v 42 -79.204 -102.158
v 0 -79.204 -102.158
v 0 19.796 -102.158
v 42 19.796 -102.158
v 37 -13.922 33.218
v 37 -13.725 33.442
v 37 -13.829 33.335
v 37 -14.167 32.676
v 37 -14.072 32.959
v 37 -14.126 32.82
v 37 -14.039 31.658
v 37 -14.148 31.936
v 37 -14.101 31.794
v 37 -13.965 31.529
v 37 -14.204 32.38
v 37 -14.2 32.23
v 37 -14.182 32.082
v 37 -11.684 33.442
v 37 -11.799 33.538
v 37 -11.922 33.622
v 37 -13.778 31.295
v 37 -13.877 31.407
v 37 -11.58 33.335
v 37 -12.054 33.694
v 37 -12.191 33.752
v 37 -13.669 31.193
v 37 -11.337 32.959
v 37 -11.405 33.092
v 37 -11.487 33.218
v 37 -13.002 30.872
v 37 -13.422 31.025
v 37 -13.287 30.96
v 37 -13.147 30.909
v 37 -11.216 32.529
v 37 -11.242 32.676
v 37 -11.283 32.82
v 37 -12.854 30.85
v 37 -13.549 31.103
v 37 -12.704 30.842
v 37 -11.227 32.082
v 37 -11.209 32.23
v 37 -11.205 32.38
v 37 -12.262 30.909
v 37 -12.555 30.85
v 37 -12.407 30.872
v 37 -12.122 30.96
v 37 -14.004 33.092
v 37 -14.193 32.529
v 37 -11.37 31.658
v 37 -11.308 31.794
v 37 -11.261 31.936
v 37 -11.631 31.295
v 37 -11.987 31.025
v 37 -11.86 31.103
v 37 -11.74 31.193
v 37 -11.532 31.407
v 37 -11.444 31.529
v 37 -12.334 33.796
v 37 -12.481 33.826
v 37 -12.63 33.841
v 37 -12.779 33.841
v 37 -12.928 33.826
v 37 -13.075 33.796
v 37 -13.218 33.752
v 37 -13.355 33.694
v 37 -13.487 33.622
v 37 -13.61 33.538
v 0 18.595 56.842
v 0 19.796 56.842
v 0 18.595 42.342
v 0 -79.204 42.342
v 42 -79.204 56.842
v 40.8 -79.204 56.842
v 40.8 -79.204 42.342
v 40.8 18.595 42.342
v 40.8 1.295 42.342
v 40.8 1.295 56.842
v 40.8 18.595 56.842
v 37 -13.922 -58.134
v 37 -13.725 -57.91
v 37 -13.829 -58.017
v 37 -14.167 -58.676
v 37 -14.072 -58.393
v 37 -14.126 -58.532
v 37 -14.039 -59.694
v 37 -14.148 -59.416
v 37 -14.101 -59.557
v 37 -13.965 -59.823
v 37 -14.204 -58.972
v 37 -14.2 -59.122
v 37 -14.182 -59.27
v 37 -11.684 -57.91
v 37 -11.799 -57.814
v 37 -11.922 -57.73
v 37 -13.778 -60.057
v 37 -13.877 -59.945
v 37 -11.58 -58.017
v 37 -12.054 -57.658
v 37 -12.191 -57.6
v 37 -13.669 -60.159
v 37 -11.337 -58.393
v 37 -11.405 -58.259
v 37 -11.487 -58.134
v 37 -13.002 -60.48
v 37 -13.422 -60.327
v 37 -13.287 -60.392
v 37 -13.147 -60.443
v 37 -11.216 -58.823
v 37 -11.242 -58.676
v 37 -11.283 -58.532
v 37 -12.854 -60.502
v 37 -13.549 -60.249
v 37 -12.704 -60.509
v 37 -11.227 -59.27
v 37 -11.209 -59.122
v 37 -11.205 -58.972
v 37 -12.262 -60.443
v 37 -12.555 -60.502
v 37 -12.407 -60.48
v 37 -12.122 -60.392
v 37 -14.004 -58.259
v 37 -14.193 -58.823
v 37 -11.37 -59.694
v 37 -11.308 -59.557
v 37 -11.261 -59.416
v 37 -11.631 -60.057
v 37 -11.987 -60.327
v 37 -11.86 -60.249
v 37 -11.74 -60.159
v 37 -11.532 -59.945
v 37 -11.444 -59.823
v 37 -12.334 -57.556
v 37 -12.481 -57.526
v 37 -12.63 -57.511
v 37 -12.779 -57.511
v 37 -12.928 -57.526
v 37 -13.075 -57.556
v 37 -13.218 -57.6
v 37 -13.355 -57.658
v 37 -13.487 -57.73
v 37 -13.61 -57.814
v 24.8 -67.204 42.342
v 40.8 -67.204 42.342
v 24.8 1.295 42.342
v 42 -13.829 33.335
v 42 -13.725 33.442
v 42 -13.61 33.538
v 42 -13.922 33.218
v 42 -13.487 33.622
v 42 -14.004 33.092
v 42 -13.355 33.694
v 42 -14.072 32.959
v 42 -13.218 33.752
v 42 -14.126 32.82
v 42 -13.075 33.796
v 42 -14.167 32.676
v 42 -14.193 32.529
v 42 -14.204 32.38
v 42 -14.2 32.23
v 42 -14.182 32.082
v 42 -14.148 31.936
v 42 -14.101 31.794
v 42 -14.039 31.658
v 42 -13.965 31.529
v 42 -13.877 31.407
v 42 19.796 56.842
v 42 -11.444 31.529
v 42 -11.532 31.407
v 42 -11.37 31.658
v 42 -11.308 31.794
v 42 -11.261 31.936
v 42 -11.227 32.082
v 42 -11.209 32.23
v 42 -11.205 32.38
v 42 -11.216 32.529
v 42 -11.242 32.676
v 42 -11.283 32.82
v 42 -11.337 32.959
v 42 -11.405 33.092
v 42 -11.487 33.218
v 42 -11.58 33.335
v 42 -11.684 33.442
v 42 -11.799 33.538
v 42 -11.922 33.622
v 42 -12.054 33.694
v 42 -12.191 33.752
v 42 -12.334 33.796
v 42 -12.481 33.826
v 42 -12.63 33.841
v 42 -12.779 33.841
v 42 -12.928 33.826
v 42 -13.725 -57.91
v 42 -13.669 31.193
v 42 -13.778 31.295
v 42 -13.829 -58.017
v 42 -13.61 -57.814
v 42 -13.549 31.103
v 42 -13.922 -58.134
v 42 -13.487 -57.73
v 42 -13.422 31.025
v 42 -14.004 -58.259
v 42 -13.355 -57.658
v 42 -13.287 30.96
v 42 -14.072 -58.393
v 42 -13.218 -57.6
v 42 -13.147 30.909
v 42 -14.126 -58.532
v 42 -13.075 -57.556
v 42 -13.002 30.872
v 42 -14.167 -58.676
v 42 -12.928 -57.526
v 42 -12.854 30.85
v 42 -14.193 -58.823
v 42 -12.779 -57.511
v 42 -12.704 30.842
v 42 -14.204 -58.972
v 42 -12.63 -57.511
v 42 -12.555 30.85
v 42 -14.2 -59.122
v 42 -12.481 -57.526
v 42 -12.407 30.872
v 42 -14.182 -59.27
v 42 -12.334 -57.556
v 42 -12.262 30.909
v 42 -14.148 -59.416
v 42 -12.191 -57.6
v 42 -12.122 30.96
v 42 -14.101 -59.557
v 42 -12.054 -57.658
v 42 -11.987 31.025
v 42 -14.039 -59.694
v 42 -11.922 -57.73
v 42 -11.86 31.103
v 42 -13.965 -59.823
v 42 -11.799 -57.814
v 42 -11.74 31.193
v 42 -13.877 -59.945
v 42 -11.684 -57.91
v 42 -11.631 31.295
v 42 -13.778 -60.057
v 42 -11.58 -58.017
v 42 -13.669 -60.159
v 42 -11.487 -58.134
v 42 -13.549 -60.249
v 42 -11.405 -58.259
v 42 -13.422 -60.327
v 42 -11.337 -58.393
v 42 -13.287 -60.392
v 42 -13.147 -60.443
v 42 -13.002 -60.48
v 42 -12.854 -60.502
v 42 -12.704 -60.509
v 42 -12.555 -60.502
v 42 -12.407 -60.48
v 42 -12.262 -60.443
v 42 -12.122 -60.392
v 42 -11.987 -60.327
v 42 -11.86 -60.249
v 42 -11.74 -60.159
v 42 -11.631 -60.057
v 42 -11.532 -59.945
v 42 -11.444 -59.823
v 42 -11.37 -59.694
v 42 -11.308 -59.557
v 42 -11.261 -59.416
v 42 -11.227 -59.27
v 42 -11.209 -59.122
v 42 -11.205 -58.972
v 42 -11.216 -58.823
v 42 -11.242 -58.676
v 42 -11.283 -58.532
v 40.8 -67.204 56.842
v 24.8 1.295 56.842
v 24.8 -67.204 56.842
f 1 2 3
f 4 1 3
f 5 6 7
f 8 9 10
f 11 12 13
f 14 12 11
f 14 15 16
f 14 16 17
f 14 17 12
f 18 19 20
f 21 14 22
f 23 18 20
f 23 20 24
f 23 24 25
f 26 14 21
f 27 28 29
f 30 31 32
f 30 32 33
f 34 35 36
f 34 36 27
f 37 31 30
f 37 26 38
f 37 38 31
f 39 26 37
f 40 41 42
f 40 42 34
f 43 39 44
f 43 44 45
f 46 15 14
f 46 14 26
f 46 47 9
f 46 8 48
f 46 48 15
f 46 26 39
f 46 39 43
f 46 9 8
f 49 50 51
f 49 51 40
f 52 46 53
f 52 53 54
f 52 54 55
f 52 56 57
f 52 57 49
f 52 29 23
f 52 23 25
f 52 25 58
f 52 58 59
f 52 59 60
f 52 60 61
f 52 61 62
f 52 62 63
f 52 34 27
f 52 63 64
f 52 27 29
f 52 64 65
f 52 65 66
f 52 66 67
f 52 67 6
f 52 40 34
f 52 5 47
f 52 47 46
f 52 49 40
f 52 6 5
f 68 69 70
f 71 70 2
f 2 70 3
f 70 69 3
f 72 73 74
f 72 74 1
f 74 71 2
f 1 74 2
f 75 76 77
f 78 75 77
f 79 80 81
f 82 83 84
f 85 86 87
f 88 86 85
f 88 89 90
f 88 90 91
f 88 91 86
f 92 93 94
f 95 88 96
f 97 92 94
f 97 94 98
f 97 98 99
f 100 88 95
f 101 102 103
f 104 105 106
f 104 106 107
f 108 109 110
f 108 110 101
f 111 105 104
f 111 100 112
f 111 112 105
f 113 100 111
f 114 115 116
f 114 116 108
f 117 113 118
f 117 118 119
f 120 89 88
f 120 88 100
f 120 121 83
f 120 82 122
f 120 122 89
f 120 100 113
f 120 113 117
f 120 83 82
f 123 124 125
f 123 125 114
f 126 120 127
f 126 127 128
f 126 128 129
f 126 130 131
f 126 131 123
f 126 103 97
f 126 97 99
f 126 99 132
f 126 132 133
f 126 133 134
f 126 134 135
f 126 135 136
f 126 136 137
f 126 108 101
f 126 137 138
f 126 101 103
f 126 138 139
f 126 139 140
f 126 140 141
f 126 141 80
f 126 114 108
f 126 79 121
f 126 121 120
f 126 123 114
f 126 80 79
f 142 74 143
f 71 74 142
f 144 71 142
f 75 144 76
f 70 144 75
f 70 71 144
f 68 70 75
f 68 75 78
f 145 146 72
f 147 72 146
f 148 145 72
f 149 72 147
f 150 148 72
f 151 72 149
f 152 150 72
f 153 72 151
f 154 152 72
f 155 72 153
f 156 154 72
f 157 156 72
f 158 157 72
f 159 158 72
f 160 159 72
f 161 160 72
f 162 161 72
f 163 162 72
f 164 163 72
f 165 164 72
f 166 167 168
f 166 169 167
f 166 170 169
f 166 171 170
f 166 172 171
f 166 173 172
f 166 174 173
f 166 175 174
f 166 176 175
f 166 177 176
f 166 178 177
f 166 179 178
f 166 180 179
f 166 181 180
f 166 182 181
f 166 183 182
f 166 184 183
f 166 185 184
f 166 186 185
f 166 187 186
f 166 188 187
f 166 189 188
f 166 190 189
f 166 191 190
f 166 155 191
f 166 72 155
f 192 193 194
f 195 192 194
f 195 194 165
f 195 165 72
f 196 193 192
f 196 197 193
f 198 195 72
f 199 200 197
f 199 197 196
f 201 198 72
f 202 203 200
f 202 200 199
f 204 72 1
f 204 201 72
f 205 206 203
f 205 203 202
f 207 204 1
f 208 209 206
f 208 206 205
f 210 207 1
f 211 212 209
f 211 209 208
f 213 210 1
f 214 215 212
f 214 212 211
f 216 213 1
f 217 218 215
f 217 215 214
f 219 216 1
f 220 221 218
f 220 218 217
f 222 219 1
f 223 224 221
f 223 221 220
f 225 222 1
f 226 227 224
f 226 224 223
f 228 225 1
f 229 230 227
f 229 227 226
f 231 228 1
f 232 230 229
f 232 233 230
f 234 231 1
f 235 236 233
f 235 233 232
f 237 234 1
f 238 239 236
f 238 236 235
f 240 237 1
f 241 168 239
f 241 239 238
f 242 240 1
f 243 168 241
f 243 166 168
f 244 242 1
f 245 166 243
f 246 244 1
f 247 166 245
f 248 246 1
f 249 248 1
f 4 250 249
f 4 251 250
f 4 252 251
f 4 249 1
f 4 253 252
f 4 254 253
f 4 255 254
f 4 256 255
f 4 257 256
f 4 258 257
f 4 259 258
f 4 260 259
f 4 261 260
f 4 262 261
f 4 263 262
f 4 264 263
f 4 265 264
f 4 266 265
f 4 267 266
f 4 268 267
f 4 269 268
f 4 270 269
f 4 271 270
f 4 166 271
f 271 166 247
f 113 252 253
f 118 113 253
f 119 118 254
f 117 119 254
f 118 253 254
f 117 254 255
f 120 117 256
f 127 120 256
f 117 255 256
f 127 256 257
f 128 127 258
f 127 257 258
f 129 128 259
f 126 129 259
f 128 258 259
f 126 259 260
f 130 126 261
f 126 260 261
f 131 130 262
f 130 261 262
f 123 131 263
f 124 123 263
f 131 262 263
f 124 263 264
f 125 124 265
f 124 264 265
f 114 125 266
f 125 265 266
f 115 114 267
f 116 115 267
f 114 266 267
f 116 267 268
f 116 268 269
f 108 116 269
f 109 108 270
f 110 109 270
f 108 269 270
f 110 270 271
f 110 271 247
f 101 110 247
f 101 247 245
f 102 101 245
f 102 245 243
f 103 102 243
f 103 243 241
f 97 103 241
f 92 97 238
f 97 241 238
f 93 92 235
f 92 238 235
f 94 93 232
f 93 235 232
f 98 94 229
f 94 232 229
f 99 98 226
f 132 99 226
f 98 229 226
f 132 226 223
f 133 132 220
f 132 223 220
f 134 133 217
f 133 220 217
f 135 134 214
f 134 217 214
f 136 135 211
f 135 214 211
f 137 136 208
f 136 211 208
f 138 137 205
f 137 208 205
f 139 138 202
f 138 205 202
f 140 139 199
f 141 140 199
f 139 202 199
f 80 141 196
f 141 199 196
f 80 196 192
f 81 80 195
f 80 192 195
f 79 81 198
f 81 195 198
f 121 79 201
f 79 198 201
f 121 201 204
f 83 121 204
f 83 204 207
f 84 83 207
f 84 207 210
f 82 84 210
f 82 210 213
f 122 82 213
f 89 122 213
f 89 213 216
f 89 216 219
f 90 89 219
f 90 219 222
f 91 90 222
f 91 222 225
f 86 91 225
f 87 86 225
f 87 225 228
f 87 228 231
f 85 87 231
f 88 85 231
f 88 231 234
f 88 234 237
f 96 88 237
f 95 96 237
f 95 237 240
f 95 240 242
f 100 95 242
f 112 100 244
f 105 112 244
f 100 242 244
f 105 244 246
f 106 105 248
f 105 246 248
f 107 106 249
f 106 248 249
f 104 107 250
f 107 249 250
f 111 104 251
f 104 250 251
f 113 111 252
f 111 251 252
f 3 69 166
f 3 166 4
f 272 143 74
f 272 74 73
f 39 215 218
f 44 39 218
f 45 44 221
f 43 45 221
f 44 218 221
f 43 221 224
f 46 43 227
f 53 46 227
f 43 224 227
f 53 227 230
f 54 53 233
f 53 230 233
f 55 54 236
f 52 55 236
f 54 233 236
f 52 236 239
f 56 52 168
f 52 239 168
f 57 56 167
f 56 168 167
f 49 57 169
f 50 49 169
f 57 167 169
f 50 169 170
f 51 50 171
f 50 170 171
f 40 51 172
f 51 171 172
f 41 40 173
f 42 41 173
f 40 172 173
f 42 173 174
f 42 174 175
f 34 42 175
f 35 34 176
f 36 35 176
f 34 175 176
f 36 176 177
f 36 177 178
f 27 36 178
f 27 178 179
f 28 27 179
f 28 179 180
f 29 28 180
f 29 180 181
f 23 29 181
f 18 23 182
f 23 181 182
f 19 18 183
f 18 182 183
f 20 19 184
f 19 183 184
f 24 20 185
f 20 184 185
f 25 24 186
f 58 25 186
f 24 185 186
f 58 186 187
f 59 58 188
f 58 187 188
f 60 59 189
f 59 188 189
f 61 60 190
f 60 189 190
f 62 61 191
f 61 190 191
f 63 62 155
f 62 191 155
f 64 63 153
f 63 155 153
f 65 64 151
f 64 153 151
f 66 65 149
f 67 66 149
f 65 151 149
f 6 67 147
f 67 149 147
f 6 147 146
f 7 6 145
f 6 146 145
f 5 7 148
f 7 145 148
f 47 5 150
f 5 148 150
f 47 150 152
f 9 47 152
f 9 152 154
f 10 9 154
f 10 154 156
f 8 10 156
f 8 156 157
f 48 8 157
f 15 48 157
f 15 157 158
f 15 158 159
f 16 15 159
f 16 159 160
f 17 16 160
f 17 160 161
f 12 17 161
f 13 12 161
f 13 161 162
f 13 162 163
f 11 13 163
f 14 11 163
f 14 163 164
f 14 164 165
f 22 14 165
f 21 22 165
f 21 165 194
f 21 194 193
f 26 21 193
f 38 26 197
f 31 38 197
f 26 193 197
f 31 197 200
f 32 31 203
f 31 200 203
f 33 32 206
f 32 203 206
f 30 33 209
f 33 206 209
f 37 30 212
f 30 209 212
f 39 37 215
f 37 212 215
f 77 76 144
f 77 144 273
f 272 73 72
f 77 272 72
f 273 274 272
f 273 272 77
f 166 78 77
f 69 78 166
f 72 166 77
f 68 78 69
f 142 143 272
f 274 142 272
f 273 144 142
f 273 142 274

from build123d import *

# Parameters (mm, degrees)
SKETCH1_W           = 159
SKETCH1_H           = 99
BOSS_EXTRUDE1_DEPTH = 42
SKETCH2_W           = 14.5
SKETCH2_H           = 97.8
CUT_EXTRUDE1_DEPTH  = 40.8
SKETCH3_W           = 14.5
SKETCH3_H           = 68.5
BOSS_EXTRUDE2_DEPTH = 16
SKETCH5_R           = 1.5
CUT_EXTRUDE2_DEPTH  = 5


with BuildPart() as part:
    # Sketch1 → Boss-Extrude1 (new body)
    with BuildSketch(Plane(origin=(0, 0, 0), x_dir=(0, 0, -1), z_dir=(1, 0, 0))):
        with Locations((22.6575, -29.7045)):
            Rectangle(SKETCH1_W, SKETCH1_H)
    extrude(amount=BOSS_EXTRUDE1_DEPTH)

    # Sketch2 → Cut-Extrude1 (cut)
    with BuildSketch(Plane.ZY):
        with Locations((49.5925, -30.3045)):
            Rectangle(SKETCH2_W, SKETCH2_H)
    extrude(amount=-CUT_EXTRUDE1_DEPTH, mode=Mode.SUBTRACT)

    # Sketch3 → Boss-Extrude2 (add)
    with BuildSketch(Plane.ZY.offset(-40.8)):
        with Locations((49.5925, -32.9545)):
            Rectangle(SKETCH3_W, SKETCH3_H)
    extrude(amount=BOSS_EXTRUDE2_DEPTH)

    # Sketch5 → Cut-Extrude2 (cut)
    with BuildSketch(Plane(origin=(42, 0, 0), x_dir=(0, 0, -1), z_dir=(1, 0, 0))):
        with Locations((-32.3425, -12.7045)):
            Circle(SKETCH5_R)
        with Locations((59.009480141, -12.7045)):
            Circle(SKETCH5_R)
    extrude(amount=-CUT_EXTRUDE2_DEPTH, mode=Mode.SUBTRACT)


solid = part.part
